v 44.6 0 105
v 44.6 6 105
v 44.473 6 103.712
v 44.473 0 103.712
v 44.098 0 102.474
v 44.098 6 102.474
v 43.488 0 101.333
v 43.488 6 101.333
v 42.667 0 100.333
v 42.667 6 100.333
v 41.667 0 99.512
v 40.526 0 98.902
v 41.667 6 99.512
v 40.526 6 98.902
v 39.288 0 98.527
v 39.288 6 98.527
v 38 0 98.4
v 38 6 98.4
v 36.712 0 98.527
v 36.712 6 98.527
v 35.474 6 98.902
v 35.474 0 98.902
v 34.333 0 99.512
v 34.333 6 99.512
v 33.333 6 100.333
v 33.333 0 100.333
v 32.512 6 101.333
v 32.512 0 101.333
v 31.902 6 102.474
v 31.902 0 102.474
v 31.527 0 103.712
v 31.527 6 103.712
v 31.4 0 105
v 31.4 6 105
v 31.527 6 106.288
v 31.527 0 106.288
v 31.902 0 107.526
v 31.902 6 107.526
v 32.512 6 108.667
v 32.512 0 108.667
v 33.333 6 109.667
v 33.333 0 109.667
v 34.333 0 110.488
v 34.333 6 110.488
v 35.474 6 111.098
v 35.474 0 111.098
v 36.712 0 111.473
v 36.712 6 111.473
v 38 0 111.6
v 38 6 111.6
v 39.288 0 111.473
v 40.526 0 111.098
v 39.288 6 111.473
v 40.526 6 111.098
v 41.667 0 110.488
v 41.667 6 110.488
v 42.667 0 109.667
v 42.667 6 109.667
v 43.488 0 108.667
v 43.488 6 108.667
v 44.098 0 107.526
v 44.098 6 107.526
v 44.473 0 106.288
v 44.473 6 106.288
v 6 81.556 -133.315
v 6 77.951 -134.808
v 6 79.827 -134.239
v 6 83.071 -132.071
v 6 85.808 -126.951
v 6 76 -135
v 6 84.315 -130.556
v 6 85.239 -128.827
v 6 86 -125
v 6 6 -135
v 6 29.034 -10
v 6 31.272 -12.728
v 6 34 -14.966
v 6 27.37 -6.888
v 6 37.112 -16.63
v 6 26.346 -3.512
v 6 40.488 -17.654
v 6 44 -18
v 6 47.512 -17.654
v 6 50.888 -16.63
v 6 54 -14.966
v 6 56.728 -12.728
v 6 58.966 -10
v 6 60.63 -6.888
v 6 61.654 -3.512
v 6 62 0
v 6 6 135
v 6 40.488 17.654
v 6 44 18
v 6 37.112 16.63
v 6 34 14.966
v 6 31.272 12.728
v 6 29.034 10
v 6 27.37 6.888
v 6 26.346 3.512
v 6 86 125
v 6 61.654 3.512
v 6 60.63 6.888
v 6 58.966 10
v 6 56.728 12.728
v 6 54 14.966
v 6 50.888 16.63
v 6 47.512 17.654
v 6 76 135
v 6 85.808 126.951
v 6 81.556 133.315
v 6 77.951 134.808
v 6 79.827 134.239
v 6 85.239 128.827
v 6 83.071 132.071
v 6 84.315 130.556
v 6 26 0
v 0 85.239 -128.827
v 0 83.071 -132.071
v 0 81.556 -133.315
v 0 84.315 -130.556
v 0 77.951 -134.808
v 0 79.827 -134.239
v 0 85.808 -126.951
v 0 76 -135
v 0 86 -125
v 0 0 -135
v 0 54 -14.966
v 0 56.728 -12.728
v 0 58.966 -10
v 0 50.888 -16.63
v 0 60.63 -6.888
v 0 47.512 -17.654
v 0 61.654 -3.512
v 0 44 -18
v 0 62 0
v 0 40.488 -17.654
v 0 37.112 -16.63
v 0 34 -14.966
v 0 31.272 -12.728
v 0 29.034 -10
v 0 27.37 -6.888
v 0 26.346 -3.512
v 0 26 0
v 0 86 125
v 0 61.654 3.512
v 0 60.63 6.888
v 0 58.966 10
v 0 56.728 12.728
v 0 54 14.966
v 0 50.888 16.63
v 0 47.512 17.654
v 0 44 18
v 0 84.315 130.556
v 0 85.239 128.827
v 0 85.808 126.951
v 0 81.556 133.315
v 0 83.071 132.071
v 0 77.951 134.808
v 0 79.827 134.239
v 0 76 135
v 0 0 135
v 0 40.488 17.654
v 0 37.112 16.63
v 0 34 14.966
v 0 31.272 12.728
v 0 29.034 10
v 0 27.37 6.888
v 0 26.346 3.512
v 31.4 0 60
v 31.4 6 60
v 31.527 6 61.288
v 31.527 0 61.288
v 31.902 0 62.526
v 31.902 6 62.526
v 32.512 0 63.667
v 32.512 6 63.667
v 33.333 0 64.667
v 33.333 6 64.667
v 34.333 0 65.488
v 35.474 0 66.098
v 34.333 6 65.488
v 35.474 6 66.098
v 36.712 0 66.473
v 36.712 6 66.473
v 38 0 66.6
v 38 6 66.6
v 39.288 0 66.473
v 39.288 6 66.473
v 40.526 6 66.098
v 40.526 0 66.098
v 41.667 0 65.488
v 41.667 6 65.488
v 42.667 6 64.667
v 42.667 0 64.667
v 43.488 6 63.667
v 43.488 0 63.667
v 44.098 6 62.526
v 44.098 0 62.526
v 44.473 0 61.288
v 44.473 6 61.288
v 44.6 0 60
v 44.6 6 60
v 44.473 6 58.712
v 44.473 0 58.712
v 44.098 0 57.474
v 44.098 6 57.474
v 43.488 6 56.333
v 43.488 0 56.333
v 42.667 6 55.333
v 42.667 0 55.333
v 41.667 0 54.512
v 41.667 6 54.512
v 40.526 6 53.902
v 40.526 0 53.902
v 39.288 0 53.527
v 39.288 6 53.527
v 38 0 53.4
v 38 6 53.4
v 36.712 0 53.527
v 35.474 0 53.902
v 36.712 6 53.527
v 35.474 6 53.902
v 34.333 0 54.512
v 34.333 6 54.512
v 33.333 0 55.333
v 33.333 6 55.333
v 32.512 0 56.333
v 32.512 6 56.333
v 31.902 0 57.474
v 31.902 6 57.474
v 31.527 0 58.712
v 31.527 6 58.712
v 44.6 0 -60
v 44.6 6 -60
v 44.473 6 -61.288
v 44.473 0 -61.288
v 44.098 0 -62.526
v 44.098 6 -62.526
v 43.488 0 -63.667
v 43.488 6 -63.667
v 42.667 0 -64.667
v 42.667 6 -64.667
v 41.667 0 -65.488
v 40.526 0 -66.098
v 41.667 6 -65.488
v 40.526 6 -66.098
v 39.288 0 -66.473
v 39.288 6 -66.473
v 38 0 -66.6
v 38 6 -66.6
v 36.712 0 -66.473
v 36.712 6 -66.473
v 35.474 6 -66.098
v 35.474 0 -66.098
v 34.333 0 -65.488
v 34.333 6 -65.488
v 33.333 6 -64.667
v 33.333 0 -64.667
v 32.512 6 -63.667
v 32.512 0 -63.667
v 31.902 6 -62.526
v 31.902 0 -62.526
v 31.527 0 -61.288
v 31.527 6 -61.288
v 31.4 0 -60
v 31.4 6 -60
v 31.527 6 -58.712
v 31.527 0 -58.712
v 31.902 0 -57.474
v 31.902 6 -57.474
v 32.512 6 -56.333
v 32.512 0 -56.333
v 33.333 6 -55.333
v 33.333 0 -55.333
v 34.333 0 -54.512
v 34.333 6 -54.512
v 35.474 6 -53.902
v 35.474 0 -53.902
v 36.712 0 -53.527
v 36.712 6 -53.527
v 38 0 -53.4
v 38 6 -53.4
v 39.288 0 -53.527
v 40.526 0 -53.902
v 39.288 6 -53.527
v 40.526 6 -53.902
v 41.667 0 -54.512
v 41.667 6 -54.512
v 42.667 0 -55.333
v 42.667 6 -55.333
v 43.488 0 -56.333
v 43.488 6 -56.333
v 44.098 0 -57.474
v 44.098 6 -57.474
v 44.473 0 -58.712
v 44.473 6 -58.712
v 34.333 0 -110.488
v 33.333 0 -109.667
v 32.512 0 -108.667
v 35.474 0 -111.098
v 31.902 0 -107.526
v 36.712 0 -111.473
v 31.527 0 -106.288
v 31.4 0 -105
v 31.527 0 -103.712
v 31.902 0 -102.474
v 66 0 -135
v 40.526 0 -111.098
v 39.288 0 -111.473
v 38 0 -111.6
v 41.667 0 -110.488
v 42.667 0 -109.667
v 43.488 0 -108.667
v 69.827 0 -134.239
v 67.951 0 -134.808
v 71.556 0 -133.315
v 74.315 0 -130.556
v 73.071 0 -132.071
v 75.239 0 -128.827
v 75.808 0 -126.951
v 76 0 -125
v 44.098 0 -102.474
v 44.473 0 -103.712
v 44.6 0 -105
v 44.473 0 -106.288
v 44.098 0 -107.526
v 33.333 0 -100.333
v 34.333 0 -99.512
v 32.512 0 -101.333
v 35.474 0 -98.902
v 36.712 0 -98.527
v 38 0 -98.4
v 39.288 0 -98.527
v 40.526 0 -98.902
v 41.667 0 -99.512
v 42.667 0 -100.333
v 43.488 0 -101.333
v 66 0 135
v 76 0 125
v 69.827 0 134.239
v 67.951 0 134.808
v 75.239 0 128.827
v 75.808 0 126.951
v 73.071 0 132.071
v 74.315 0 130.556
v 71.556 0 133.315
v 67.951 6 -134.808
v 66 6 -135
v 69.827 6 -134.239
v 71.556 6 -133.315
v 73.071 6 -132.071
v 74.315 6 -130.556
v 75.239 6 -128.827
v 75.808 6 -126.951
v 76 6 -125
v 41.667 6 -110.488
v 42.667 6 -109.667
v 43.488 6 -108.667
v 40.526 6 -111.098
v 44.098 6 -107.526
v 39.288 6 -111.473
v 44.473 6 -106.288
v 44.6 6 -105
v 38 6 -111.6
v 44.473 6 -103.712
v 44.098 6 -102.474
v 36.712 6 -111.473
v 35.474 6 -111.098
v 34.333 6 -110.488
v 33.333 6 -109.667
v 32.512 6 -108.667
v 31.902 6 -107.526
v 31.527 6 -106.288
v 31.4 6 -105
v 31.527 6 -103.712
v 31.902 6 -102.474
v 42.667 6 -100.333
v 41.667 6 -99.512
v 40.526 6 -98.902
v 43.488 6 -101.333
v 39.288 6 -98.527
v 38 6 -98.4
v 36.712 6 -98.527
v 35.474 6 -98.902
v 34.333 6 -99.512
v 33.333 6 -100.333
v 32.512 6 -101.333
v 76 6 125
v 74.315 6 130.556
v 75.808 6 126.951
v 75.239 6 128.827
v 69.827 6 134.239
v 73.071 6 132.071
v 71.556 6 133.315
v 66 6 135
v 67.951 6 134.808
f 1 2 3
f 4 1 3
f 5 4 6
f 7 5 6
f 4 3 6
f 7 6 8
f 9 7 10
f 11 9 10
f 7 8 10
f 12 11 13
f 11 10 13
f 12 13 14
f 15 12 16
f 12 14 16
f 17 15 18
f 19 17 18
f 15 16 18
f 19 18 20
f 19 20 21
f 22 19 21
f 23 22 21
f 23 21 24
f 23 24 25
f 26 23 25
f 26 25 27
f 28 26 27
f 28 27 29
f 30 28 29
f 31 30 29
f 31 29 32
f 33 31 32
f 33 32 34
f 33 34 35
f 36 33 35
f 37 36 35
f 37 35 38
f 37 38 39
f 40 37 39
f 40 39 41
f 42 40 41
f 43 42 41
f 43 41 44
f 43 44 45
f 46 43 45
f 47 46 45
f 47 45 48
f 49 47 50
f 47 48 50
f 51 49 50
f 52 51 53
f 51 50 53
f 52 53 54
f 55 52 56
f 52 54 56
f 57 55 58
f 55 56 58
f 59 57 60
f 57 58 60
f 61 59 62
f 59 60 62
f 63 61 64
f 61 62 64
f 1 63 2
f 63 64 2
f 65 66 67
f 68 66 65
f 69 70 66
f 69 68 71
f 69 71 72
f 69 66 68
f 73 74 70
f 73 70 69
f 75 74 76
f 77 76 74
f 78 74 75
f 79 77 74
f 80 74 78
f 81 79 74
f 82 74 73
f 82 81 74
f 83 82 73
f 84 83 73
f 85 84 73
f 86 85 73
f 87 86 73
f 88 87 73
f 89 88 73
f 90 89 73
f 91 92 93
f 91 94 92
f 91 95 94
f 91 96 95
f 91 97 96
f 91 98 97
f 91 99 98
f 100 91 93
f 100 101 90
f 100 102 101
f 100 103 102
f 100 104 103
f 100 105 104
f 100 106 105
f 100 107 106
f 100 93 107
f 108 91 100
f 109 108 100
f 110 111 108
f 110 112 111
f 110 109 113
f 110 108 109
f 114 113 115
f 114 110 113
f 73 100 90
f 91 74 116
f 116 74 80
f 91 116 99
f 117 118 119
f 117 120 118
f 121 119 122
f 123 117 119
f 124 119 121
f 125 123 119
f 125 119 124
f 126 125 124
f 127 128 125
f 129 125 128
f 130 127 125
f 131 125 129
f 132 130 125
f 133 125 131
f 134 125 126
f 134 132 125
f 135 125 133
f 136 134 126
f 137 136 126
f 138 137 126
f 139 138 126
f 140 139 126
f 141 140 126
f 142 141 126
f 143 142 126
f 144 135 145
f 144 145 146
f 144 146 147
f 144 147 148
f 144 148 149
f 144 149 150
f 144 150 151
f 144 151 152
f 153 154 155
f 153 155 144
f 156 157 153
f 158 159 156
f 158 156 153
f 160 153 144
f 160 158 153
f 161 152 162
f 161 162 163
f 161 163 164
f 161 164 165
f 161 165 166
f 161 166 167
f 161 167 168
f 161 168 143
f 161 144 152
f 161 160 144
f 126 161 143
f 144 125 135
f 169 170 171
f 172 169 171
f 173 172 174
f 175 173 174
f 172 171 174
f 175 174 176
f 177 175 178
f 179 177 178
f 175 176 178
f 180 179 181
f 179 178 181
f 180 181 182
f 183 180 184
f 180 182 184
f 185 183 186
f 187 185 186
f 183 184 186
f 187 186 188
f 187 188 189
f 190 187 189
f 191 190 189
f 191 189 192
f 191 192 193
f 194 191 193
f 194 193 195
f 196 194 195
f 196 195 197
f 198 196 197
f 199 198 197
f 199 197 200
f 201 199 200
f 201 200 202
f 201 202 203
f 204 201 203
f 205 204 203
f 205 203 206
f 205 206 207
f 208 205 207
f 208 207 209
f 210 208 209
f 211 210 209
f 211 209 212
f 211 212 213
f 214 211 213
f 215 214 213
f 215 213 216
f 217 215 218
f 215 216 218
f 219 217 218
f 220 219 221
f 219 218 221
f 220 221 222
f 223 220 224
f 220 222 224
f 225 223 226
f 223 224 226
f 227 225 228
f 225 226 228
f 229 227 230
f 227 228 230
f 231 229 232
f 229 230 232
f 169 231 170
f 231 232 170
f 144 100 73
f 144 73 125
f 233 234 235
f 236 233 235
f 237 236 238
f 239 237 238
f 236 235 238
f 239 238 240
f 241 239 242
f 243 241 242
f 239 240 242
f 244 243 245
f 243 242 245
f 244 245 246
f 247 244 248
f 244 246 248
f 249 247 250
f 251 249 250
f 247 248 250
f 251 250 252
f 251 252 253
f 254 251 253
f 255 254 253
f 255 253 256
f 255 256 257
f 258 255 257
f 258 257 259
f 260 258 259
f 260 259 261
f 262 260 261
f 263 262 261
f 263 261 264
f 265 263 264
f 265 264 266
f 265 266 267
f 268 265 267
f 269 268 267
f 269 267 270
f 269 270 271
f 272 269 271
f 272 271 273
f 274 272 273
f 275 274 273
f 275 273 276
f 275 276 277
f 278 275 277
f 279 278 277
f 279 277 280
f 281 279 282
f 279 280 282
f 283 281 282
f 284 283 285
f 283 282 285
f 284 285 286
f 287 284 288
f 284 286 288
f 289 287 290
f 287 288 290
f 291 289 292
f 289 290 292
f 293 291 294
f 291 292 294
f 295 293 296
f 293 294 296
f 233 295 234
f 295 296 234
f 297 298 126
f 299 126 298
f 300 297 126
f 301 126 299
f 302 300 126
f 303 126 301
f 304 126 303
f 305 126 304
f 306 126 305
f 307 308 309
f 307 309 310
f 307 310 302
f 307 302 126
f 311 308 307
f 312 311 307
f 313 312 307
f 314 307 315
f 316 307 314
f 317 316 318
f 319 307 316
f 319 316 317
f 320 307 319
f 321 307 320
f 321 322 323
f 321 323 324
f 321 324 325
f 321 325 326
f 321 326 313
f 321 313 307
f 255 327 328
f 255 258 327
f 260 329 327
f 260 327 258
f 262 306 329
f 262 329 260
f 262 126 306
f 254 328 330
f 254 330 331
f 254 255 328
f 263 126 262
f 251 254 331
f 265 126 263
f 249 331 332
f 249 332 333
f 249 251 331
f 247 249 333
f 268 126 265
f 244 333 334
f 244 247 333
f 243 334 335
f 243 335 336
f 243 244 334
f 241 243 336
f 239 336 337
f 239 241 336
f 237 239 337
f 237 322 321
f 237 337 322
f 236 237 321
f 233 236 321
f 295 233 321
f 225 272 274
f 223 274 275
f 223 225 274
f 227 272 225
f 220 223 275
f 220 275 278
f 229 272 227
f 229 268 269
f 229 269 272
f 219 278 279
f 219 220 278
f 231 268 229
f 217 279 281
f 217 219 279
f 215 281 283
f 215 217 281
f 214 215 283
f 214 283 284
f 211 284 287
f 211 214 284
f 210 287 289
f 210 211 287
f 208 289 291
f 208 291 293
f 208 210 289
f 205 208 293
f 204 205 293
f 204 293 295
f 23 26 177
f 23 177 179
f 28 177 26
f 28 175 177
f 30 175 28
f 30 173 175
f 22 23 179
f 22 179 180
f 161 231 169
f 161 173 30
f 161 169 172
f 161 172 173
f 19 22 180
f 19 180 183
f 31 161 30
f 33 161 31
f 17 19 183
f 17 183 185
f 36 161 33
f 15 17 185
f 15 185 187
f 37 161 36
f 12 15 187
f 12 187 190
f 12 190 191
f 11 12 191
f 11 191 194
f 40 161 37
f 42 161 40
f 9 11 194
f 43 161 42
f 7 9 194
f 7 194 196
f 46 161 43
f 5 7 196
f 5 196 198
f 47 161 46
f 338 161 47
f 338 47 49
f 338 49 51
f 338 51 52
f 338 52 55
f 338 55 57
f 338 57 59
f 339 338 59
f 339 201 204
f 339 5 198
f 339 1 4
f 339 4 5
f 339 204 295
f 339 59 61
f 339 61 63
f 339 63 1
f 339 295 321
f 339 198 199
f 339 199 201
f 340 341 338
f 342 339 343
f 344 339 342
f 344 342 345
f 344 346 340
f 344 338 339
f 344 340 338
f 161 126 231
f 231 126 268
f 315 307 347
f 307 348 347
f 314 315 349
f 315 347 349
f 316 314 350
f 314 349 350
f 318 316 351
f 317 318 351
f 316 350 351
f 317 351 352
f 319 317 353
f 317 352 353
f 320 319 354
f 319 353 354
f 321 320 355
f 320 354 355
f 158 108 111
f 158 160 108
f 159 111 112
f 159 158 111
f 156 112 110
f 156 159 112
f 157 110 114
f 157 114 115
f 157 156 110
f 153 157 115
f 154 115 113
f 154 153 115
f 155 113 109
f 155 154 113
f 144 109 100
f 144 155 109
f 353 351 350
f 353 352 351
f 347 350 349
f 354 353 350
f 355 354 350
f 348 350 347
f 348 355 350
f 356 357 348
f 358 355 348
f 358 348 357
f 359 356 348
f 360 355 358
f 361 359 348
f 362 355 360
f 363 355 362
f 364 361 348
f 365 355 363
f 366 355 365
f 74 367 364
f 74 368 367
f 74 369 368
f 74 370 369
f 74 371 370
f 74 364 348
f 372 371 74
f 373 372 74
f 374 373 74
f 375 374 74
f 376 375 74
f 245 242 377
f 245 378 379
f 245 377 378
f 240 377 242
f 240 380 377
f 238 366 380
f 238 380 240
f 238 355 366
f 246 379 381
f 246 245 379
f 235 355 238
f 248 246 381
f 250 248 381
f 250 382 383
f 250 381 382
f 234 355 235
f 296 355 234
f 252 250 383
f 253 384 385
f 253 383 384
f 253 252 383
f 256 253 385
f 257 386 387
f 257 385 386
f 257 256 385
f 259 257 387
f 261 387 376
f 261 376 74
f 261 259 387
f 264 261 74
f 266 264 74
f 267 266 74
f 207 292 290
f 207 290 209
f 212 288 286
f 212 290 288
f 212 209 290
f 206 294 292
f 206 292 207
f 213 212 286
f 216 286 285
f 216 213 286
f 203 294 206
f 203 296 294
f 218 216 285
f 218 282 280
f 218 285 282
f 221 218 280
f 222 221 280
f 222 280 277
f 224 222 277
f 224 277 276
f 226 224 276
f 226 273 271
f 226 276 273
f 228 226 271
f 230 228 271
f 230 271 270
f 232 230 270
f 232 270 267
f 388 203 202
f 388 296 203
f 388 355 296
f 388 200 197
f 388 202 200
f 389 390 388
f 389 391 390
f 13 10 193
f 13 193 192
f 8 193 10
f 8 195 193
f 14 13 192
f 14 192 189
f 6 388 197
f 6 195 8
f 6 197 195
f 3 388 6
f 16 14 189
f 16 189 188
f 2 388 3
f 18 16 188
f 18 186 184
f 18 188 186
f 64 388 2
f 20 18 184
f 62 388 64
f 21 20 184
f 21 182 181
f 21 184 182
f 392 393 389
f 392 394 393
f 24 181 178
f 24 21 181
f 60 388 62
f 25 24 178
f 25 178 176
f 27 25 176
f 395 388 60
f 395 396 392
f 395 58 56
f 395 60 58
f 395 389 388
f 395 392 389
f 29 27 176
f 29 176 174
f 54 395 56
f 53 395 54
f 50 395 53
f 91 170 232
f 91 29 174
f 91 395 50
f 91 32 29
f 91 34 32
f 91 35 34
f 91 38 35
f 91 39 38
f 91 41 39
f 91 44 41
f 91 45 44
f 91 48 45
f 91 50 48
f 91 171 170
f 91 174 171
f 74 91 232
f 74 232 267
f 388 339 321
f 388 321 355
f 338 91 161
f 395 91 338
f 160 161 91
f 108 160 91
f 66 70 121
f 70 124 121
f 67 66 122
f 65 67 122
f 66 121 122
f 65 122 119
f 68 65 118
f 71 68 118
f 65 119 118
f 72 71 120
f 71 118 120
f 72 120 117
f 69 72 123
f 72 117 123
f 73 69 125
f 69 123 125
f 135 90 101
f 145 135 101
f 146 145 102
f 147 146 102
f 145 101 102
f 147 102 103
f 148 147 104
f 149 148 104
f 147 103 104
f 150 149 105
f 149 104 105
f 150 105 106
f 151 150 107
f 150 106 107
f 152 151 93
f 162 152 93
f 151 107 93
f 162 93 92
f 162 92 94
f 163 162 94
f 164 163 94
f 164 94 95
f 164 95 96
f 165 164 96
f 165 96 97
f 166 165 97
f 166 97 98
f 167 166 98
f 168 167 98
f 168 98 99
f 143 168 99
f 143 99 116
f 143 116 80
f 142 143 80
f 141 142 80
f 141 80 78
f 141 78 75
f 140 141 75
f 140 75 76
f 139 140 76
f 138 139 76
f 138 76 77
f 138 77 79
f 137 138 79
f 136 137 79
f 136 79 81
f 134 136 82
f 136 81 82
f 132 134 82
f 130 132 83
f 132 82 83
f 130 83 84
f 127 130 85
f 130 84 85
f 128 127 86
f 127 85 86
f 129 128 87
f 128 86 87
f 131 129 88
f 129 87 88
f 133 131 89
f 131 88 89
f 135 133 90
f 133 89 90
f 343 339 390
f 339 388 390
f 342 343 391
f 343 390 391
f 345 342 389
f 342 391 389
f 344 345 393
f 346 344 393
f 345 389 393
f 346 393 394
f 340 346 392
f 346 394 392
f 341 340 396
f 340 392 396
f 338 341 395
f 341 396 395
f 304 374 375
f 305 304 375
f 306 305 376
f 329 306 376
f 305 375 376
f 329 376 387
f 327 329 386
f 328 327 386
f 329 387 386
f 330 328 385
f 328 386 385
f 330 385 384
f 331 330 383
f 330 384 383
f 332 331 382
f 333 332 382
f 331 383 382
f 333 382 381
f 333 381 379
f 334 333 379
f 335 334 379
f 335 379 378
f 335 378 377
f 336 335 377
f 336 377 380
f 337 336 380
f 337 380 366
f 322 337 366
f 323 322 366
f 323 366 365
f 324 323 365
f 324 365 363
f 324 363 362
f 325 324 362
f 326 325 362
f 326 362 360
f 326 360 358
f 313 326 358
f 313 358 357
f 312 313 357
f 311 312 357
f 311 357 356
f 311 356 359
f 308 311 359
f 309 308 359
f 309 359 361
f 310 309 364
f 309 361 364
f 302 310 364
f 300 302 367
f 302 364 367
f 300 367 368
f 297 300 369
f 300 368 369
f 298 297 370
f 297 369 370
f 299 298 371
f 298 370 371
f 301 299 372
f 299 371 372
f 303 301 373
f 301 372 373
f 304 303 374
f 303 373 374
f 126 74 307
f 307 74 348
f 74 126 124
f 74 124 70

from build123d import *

# Parameters (mm, degrees)
EXTRUDE_1_DEPTH     = 135
SKETCH_3_R          = 18
CUT_EXTRUDE_2_DEPTH = 175.702604445
SKETCH_4_R          = 6.6
CUT_EXTRUDE_3_DEPTH = 175.358825415
FILLET_1_R          = 10


with BuildPart() as part:
    # Эскиз1 → Бобышка-Вытянуть1 (new, symmetric)
    with BuildSketch(Plane.XY):
        Polygon((0, 0), (76, 0), (76, 6), (6, 6), (6, 86), (0, 86), align=None)
    extrude(amount=EXTRUDE_1_DEPTH, both=True)

    # Эскиз3 → Вырез-Вытянуть2 (cut, through all)
    with BuildSketch(Plane(origin=(6, 0, 0), x_dir=(0, 0, -1), z_dir=(1, 0, 0))):
        with Locations(Location((0, 44, 0), (0, 0, 90))):
            Circle(SKETCH_3_R)
    extrude(amount=-CUT_EXTRUDE_2_DEPTH, mode=Mode.SUBTRACT)

    # Эскиз4 → Вырез-Вытянуть3 (cut, through all)
    with BuildSketch(Plane(origin=(0, 6, 0), x_dir=(1, 0, 0), z_dir=(0, 1, 0))):
        with Locations(Location((38, 105, 0), (0, 0, 180))):
            Circle(SKETCH_4_R)
        with Locations((38, 60)):
            Circle(SKETCH_4_R)
        with Locations(Location((38, -60, 0), (0, 0, 180))):
            Circle(SKETCH_4_R)
        with Locations((38, -105)):
            Circle(SKETCH_4_R)
    extrude(amount=-CUT_EXTRUDE_3_DEPTH, mode=Mode.SUBTRACT)

    # Скругление1
    fillet_1_edges = [part.edges().sort_by_distance(p)[0] for p in [
        (76, 3, 135),
        (3, 86, 135),
        (3, 86, -135),
        (76, 3, -135),
    ]]
    fillet(fillet_1_edges, radius=FILLET_1_R)


solid = part.part
